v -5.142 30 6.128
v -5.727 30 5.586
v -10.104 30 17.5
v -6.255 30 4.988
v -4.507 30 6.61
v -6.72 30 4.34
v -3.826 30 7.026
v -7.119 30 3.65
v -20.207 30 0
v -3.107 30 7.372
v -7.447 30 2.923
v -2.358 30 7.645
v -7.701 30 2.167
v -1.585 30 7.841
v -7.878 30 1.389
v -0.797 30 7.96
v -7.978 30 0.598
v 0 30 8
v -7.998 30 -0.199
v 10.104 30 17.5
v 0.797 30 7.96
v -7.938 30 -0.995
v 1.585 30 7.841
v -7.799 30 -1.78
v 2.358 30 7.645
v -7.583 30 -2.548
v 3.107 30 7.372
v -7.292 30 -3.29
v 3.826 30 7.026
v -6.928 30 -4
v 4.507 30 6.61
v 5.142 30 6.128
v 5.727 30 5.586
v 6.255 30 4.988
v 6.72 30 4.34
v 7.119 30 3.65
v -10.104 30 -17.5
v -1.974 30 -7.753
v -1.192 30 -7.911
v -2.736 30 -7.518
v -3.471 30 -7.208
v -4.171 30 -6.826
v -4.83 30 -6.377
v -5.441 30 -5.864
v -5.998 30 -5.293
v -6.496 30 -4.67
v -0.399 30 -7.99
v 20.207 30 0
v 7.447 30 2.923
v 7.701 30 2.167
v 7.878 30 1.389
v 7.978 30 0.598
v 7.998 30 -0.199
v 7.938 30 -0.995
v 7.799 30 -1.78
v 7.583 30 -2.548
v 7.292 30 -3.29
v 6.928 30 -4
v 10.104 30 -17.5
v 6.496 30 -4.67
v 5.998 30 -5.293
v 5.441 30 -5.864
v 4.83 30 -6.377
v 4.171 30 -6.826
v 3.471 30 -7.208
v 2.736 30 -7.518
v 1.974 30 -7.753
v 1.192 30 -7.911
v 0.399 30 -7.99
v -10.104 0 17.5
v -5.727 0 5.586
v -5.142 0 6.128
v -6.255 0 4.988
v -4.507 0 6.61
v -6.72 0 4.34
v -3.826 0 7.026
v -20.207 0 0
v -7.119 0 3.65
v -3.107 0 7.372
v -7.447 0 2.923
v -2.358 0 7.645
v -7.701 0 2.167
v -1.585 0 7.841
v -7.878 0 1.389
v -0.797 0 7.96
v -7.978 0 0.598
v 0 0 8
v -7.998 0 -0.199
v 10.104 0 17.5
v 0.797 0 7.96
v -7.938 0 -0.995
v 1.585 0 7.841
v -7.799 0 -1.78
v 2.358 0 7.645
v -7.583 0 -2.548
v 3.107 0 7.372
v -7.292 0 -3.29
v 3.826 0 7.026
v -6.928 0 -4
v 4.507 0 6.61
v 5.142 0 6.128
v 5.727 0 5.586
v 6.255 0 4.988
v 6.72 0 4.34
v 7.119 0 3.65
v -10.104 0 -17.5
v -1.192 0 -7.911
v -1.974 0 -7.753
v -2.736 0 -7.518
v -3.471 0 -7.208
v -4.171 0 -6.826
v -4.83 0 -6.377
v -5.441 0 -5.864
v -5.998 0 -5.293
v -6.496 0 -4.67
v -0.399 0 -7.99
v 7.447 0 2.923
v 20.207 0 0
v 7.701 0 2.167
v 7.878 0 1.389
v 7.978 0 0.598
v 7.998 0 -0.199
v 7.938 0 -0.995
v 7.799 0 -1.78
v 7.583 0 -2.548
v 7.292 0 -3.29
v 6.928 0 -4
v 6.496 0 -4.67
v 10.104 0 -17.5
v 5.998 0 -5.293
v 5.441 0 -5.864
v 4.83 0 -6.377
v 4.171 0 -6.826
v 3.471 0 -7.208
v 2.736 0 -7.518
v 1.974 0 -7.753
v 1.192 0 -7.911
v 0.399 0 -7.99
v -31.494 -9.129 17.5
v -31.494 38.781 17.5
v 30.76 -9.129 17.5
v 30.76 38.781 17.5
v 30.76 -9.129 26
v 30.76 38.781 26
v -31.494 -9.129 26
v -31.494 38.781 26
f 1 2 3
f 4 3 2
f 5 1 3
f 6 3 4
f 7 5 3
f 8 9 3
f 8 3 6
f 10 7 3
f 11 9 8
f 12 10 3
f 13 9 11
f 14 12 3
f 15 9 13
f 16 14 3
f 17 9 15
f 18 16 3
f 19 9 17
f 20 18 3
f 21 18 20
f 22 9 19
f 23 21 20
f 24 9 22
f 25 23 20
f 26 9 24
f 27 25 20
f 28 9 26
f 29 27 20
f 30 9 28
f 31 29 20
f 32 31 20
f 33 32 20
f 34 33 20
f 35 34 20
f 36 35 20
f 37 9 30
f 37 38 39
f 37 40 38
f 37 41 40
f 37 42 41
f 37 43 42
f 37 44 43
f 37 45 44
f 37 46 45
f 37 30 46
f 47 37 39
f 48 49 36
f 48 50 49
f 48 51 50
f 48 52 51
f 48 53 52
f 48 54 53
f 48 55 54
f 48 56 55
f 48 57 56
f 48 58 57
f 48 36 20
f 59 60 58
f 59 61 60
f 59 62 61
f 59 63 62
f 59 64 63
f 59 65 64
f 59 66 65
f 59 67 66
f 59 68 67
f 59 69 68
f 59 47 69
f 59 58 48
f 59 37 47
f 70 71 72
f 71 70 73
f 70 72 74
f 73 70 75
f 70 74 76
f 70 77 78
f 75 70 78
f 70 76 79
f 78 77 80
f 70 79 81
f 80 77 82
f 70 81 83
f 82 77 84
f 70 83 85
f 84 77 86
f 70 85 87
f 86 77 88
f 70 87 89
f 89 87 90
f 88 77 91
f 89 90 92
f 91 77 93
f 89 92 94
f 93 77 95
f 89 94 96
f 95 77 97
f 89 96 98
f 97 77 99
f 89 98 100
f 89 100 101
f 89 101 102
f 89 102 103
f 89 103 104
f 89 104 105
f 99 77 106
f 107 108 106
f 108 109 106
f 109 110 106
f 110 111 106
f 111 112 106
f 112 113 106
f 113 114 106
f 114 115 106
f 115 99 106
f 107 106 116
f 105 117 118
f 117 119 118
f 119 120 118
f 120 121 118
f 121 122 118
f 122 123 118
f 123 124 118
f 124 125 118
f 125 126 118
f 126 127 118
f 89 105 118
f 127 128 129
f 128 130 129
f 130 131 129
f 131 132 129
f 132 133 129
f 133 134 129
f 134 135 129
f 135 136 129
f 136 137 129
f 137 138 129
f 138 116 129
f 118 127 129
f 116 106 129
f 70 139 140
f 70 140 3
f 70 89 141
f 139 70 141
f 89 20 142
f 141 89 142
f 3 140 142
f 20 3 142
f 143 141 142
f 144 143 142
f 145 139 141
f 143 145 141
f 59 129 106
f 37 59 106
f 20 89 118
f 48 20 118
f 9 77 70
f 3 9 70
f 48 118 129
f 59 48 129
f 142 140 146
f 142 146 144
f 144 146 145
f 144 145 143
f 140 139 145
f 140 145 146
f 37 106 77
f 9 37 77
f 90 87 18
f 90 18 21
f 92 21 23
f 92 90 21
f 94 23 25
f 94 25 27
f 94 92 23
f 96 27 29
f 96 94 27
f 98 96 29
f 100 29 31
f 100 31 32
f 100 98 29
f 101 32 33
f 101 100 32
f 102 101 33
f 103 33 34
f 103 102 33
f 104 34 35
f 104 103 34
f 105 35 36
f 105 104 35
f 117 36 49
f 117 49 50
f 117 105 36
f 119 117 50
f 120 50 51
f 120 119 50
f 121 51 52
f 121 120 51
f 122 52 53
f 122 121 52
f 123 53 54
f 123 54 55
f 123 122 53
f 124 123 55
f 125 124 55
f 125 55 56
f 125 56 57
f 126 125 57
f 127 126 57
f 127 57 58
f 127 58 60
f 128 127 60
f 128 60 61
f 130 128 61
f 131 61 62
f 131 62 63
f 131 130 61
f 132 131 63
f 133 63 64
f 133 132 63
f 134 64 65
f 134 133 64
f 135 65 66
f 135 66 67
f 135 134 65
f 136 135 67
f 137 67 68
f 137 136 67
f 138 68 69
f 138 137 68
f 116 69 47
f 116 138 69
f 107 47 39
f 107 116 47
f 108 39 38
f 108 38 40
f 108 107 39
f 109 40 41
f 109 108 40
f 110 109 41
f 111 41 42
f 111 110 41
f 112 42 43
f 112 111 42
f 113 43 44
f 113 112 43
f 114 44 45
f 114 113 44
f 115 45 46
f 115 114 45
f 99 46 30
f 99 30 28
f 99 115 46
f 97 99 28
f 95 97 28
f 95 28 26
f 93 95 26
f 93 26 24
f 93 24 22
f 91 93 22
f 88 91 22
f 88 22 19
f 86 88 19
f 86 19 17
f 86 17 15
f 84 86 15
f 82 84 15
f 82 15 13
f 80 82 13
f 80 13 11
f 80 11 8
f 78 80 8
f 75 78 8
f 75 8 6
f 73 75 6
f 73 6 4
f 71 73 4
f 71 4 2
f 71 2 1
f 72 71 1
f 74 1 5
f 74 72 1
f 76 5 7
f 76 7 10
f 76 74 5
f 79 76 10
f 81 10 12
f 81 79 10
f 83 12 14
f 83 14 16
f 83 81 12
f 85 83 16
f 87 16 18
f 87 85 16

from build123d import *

# Parameters (mm, degrees)
CROQUIS1_R              = 8
SALIENTE_EXTRUIR1_DEPTH = 30
CROQUIS2_W              = 62.253703669
CROQUIS2_H              = 47.910213751
SALIENTE_EXTRUIR2_DEPTH = 8.5


with BuildPart() as part:
    # Croquis1 → Saliente-Extruir1 (new body)
    with BuildSketch(Plane(origin=(0, 0, 0), x_dir=(1, 0, 0), z_dir=(0, 1, 0))):
        Polygon((20.207259422, 0), (10.103629711, 17.5), (-10.103629711, 17.5), (-20.207259422, 0), (-10.103629711, -17.5), (10.103629711, -17.5), align=None)
        with Locations(Location((0, 0, 0), (0, 0, 270))):
            Circle(CROQUIS1_R, mode=Mode.SUBTRACT)
    extrude(amount=SALIENTE_EXTRUIR1_DEPTH)

    # Croquis2 → Saliente-Extruir2 (add)
    with BuildSketch(Plane.XY.offset(17.5)):
        with Locations((-0.366655868, 14.825803959)):
            Rectangle(CROQUIS2_W, CROQUIS2_H)
    extrude(amount=SALIENTE_EXTRUIR2_DEPTH)


solid = part.part
